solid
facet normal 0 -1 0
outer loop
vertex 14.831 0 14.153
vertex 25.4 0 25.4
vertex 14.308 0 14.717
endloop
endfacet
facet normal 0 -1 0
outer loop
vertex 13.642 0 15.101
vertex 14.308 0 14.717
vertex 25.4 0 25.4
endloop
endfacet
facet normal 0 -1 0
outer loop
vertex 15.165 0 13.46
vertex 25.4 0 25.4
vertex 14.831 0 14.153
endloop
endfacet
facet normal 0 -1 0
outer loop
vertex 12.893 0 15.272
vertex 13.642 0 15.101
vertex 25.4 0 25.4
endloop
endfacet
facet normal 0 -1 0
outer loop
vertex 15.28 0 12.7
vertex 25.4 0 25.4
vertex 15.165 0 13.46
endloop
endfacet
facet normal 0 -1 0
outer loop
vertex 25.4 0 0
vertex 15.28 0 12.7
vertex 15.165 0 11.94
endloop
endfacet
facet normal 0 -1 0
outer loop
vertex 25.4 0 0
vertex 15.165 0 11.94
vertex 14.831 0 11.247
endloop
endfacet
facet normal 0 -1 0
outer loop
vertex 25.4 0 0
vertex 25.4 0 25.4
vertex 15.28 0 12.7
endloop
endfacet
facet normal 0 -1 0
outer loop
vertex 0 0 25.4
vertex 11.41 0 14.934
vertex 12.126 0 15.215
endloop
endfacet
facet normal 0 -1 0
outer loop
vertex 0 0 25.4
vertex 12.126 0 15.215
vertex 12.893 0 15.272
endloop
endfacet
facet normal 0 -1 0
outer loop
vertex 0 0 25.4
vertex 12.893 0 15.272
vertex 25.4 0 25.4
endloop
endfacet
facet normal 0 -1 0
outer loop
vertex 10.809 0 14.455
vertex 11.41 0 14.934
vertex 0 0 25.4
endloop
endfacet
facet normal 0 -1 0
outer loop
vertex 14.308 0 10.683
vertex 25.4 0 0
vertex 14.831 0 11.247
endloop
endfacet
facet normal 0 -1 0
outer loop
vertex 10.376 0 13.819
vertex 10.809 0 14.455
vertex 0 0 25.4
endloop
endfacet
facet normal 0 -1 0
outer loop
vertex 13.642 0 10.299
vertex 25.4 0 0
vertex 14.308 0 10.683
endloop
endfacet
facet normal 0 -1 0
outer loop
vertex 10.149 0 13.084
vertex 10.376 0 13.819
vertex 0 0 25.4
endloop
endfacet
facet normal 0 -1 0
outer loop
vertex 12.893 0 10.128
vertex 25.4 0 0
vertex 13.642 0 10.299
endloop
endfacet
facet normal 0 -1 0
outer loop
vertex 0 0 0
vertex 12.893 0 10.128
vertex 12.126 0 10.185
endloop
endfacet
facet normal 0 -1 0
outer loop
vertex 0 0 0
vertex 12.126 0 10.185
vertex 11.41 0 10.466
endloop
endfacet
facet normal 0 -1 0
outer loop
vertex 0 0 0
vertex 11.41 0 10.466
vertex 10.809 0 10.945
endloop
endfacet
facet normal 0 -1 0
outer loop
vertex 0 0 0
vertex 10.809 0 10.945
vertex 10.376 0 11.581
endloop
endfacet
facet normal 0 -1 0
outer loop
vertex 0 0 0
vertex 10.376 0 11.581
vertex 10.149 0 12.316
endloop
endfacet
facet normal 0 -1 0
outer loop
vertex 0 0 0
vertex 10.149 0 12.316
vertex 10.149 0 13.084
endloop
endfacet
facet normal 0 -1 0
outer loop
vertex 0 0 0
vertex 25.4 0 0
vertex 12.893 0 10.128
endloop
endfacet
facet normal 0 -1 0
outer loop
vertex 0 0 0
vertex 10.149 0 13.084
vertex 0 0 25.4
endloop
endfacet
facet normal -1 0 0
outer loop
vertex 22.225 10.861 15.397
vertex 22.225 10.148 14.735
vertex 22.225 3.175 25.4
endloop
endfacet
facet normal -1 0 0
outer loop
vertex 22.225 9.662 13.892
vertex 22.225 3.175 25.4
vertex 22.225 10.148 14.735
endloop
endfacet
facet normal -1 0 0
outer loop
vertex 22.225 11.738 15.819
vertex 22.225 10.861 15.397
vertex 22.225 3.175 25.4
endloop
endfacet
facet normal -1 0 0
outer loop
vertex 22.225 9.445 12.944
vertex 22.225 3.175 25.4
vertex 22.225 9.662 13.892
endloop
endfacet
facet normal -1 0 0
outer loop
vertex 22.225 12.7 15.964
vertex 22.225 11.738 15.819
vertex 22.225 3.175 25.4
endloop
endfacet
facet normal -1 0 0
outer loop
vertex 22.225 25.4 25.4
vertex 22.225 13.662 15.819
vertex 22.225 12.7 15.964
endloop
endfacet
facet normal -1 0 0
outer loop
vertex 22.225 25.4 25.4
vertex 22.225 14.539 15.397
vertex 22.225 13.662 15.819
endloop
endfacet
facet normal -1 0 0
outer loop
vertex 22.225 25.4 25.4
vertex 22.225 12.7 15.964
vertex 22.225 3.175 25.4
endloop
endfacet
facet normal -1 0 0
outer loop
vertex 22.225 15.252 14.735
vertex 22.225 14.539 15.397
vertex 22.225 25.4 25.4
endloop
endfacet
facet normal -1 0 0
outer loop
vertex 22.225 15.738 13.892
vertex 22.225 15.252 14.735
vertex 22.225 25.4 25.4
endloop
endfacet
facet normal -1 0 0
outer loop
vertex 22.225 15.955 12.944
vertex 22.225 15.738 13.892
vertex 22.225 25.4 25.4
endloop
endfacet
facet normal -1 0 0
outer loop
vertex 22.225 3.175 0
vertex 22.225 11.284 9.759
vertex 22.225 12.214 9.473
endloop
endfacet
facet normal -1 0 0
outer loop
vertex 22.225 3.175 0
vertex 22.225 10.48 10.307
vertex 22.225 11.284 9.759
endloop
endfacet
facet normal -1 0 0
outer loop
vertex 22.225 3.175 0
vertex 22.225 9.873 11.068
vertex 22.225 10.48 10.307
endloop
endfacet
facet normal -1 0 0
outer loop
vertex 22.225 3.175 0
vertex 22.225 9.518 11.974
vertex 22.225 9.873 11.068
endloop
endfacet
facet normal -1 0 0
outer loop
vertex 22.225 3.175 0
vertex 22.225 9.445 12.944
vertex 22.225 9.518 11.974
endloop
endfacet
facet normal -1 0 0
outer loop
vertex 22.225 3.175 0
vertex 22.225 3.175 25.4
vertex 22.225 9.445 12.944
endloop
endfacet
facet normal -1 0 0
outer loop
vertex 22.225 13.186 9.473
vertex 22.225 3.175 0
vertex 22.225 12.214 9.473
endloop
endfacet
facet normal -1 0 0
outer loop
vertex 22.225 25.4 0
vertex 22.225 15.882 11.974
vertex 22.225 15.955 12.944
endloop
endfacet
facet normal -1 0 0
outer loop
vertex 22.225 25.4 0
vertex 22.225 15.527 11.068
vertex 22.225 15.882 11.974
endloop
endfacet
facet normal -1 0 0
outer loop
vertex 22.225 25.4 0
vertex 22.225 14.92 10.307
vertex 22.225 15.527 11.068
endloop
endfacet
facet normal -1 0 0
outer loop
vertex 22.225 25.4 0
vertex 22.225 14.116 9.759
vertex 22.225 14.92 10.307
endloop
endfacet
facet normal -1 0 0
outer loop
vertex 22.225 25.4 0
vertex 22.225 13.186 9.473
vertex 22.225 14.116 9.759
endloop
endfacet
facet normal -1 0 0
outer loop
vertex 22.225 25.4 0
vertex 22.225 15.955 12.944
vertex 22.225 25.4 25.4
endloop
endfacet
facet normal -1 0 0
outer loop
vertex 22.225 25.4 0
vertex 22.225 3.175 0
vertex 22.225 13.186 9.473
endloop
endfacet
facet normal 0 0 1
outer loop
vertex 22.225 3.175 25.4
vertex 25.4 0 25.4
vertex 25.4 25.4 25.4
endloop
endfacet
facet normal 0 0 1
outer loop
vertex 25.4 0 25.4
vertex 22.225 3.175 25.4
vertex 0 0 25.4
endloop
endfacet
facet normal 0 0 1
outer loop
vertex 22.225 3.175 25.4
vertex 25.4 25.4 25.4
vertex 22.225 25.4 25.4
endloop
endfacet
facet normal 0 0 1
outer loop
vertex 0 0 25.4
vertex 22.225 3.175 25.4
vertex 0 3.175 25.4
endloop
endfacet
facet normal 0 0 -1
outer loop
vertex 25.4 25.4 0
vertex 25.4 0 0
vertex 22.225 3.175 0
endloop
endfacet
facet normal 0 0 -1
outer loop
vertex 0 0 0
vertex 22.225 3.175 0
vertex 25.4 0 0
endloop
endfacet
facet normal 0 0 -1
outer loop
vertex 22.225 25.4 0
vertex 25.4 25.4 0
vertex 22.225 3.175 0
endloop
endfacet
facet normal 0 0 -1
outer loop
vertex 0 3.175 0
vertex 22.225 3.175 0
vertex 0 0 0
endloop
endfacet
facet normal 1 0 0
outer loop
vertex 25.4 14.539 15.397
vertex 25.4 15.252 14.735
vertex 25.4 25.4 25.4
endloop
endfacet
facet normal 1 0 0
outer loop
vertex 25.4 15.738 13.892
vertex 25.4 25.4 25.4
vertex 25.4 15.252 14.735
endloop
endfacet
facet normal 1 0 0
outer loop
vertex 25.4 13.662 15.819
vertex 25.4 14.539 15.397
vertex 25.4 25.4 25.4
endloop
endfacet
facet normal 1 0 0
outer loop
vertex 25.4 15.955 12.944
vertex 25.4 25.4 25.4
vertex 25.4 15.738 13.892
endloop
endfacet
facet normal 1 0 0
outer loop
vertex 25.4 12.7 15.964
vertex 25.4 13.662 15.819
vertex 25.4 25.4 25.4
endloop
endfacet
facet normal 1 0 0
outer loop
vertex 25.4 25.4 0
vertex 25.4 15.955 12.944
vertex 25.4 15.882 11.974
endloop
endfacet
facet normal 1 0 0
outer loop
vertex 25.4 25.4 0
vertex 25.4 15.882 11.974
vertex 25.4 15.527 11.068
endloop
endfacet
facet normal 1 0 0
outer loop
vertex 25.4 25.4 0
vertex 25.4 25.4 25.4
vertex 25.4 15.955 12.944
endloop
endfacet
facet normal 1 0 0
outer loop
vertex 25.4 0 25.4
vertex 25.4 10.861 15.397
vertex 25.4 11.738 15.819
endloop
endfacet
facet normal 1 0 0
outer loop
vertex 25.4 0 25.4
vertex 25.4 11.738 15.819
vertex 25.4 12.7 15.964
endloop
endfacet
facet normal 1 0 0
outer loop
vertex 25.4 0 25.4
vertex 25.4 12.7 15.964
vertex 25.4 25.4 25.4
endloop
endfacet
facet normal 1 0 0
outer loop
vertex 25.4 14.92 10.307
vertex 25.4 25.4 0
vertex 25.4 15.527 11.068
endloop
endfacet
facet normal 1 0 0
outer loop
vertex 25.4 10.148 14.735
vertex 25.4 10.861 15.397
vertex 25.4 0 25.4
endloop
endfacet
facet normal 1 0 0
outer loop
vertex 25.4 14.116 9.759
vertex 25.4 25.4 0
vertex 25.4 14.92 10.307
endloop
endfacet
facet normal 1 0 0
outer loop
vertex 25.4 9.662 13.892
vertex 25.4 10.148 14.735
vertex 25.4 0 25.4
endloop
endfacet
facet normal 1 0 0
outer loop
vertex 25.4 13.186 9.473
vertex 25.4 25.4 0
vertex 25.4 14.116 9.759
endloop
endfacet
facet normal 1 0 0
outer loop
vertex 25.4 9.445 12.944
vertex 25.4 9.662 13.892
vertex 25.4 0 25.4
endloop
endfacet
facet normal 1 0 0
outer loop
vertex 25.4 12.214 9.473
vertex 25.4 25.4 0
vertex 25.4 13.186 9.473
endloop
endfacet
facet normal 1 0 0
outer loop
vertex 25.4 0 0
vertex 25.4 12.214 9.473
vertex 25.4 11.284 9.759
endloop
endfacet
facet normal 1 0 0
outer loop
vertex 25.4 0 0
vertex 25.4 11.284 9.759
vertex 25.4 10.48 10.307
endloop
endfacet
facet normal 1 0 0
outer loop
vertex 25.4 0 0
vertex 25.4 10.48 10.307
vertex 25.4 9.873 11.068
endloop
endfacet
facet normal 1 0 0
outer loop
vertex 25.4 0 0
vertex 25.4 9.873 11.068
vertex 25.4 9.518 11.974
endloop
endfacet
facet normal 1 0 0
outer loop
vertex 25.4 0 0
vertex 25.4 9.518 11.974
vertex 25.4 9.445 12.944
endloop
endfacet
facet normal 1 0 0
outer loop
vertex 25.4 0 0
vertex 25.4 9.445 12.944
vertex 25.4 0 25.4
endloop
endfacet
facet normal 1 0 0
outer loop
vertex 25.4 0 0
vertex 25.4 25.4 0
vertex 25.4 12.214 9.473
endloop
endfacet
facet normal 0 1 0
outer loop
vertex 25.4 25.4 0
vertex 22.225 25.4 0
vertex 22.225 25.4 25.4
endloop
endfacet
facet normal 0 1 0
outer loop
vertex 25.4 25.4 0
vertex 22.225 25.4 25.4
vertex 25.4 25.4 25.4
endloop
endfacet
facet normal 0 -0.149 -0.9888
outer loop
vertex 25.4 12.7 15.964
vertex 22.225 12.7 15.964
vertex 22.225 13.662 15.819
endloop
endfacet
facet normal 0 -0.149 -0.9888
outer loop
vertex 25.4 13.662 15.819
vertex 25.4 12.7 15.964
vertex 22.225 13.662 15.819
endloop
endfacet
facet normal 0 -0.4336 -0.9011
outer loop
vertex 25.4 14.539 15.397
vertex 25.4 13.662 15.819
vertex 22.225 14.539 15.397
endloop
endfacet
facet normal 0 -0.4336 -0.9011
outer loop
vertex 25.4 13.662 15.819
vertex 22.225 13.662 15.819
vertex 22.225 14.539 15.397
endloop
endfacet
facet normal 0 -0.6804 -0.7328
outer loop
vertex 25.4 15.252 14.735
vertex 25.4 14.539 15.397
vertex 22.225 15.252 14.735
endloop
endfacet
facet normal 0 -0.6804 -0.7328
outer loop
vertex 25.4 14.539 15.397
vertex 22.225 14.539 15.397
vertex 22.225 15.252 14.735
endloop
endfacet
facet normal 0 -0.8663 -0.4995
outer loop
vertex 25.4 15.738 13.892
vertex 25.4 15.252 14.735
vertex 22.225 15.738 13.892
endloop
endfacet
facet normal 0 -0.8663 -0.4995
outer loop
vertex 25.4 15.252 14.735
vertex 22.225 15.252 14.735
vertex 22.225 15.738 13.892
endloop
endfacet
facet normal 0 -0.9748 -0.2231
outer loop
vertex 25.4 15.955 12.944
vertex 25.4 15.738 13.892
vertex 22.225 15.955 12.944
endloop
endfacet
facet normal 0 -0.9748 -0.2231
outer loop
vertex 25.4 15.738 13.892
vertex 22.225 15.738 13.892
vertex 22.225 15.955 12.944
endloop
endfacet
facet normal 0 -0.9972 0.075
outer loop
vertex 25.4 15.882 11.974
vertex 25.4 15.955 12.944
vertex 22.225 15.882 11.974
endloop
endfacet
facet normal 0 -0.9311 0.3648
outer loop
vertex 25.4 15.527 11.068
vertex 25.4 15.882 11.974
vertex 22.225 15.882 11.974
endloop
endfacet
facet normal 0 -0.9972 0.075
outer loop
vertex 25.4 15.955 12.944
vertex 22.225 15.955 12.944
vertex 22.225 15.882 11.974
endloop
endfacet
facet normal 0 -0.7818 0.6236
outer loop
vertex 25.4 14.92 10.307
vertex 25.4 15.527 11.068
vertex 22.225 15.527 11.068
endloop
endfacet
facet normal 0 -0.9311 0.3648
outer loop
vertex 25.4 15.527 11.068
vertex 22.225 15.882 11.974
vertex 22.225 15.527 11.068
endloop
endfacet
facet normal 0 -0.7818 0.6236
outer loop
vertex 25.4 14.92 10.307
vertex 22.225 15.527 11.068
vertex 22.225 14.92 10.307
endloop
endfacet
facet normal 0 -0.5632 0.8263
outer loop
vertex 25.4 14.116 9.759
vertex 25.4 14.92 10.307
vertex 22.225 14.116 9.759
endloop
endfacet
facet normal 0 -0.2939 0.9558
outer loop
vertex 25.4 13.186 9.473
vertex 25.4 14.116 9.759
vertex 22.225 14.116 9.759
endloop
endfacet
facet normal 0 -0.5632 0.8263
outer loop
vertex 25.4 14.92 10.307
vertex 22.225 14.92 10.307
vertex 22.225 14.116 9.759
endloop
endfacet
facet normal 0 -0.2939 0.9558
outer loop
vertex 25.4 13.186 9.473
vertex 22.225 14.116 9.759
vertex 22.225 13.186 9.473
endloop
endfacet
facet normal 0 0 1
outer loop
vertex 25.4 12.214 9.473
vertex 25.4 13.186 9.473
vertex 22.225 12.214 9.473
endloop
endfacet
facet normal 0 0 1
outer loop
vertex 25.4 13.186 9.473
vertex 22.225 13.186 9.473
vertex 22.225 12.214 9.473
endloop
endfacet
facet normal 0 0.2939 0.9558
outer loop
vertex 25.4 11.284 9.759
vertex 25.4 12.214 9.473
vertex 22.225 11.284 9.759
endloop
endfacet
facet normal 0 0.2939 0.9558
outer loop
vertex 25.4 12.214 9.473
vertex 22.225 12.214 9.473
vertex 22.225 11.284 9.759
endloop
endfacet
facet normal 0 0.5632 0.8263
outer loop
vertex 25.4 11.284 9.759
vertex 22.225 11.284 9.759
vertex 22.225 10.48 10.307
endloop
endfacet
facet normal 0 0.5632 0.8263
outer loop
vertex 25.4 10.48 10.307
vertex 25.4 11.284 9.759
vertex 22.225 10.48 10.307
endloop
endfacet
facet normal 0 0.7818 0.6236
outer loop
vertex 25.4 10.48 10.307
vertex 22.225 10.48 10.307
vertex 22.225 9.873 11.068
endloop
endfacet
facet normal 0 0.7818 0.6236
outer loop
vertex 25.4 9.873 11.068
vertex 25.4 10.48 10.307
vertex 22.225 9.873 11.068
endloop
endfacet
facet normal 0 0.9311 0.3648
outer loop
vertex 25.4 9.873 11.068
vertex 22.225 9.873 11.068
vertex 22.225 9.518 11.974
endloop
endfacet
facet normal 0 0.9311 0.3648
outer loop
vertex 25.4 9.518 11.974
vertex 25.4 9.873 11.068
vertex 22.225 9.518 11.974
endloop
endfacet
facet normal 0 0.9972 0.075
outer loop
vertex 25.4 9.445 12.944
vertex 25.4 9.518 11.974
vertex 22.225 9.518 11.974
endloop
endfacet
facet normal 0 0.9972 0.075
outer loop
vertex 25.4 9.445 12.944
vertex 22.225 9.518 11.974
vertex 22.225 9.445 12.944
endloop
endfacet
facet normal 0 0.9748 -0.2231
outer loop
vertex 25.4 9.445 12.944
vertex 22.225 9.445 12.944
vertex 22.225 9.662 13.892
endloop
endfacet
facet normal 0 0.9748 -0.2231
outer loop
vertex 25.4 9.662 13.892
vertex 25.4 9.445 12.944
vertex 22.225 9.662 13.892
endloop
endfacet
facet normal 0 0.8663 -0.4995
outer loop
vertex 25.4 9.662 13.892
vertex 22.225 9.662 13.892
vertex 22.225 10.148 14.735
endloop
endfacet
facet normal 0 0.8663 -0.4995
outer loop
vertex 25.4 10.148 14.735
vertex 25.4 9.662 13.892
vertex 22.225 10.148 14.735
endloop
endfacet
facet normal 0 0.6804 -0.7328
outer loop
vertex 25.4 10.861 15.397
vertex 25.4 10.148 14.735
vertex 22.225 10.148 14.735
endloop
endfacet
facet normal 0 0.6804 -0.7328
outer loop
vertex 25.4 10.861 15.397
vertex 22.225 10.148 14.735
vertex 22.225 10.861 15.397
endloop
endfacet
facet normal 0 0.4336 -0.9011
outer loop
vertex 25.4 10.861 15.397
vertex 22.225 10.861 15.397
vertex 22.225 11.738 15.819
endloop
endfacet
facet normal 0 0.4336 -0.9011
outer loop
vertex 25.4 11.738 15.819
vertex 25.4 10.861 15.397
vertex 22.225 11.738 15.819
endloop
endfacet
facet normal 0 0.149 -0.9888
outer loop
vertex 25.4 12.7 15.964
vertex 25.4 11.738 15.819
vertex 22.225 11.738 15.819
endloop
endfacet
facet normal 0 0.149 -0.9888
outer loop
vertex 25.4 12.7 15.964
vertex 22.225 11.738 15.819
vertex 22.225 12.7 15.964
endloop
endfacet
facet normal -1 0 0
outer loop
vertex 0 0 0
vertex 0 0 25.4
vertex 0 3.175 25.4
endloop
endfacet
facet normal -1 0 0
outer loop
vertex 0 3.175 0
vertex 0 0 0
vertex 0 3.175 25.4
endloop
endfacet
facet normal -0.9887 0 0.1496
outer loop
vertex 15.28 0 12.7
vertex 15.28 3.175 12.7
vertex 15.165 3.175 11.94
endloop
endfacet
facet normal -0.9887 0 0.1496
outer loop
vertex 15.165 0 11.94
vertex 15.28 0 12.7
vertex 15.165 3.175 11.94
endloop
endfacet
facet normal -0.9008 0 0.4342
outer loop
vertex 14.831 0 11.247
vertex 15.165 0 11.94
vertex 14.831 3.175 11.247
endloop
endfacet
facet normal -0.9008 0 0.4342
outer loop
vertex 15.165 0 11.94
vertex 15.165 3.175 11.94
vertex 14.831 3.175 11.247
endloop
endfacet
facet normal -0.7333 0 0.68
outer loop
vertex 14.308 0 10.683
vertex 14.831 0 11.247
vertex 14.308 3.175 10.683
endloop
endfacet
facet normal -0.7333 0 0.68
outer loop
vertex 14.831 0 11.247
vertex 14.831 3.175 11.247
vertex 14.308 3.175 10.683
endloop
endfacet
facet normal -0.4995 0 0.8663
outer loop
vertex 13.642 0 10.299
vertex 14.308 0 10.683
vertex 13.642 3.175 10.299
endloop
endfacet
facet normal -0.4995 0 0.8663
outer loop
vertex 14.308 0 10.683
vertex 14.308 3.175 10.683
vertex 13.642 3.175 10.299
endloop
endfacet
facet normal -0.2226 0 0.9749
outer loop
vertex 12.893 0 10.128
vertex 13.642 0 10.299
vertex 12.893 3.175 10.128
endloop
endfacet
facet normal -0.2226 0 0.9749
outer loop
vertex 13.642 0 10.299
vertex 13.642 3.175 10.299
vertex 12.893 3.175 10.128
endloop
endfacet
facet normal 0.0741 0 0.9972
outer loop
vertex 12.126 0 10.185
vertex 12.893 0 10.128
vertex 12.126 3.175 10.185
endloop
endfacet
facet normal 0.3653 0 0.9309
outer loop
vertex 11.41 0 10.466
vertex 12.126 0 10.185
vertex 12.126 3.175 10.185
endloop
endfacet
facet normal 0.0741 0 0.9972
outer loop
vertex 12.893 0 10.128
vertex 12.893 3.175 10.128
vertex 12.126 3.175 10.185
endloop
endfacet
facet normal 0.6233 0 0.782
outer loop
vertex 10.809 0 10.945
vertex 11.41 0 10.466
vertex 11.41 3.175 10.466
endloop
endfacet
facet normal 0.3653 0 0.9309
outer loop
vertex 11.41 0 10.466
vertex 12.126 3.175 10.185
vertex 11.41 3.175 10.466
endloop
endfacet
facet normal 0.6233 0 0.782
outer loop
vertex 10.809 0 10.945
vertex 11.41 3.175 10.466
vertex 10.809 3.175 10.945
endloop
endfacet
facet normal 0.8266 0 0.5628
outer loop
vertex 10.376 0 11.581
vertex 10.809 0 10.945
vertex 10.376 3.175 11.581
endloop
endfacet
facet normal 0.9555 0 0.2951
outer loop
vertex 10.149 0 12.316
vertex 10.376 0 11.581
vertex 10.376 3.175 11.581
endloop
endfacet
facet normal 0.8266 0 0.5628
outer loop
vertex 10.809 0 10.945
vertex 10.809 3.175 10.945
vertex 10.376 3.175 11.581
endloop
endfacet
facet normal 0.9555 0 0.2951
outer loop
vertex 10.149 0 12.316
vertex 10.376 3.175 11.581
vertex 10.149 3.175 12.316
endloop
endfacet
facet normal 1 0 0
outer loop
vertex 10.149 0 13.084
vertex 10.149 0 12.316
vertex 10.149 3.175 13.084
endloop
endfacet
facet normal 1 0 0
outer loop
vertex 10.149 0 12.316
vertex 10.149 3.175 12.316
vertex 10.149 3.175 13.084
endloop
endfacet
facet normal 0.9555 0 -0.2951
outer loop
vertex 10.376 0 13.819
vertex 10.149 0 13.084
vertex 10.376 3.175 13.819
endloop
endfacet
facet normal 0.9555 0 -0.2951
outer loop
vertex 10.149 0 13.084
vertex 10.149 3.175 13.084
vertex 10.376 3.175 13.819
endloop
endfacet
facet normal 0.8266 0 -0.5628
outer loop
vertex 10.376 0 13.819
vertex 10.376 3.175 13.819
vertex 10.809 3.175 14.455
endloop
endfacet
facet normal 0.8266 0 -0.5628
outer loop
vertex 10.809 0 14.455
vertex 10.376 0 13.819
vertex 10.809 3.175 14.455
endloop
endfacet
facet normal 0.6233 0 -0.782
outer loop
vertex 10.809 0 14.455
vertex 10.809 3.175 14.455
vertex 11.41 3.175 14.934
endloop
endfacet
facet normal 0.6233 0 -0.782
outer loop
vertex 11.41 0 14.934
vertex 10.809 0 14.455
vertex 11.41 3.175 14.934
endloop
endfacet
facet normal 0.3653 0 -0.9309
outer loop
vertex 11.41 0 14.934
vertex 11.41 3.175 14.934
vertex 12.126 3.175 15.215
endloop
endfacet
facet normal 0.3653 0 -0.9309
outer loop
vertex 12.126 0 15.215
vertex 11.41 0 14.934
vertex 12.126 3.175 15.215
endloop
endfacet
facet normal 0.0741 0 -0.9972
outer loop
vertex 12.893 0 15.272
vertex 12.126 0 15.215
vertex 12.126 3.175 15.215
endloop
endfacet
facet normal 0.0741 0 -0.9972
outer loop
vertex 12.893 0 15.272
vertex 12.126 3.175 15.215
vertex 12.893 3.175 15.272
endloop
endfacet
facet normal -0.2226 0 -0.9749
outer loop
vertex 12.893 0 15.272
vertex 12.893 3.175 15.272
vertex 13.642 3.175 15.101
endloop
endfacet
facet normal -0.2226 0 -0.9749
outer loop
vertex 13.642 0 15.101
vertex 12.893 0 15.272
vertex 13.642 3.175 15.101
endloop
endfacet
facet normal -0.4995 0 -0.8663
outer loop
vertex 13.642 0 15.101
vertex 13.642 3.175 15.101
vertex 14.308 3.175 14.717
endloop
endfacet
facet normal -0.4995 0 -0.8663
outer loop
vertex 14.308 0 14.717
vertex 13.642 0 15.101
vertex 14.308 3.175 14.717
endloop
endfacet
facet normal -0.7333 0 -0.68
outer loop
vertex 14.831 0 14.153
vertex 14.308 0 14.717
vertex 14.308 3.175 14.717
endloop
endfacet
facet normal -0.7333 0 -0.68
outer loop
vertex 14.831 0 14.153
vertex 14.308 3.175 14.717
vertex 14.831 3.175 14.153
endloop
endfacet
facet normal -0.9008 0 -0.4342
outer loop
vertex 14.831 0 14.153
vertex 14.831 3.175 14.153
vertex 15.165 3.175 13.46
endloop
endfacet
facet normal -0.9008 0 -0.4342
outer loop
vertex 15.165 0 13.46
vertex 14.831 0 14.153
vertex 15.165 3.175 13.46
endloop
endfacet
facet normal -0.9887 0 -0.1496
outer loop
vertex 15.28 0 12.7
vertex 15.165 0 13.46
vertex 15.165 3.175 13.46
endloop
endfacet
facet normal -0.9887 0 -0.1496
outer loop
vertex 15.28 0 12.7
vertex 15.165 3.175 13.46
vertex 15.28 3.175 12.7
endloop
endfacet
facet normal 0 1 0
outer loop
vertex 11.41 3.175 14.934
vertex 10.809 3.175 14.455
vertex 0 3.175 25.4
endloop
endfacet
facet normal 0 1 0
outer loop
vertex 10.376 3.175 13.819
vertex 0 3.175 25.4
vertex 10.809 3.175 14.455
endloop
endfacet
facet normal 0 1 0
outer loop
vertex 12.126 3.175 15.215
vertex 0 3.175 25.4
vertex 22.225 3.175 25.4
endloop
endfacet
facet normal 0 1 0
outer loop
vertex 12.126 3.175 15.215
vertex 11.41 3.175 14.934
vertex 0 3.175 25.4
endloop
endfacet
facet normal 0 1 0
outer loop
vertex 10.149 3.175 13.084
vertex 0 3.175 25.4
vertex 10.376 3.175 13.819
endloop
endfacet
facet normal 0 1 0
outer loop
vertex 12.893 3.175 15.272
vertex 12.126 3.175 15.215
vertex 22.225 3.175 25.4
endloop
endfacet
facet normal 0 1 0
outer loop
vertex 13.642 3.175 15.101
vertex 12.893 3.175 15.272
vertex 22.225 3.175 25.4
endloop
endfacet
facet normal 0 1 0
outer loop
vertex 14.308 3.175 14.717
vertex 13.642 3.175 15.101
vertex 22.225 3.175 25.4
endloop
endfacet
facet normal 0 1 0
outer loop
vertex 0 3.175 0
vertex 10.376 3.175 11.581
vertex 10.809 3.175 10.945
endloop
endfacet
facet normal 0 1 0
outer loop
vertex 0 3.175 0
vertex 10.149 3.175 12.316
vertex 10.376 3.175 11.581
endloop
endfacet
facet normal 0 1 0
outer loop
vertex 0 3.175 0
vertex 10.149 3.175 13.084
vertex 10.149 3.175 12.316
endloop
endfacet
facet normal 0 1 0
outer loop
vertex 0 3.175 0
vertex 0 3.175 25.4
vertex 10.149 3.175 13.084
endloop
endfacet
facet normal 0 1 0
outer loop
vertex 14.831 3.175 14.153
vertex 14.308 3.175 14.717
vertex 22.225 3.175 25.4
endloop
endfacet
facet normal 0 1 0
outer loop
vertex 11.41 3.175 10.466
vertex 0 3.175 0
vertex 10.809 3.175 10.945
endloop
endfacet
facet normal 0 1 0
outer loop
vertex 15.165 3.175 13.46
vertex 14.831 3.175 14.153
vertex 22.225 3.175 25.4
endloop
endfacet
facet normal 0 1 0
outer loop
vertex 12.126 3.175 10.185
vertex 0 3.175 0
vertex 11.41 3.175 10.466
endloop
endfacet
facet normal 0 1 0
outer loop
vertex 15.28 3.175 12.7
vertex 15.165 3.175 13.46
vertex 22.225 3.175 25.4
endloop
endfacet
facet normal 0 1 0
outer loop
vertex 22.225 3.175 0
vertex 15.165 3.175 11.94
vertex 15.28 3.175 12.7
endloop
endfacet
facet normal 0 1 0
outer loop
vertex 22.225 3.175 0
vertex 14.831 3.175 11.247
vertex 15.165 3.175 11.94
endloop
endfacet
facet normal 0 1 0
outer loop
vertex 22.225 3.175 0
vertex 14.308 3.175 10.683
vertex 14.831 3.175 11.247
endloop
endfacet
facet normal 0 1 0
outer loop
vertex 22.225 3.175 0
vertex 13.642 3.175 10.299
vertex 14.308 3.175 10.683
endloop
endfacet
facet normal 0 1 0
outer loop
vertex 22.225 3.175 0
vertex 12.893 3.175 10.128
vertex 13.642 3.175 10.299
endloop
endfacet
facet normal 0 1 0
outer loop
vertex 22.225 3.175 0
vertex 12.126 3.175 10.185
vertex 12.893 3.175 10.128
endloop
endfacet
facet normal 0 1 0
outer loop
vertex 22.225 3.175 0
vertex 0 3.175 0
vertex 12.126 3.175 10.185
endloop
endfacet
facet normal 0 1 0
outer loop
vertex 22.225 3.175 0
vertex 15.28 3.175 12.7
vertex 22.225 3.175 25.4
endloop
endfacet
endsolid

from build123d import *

# Parameters (mm, degrees)
BOSS_EXTRUDE1_DEPTH              = 25.4
F_13_64_0_20313_DIAMETER_HOLE1_D = 5.159375
F_0_257_DIAMETER_HOLE1_D         = 6.5278


with BuildPart() as part:
    # Sketch1 → Boss-Extrude1 (new body)
    with BuildSketch(Plane.XY):
        Polygon((0, 3.175), (22.225, 3.175), (22.225, 25.4), (25.4, 25.4), (25.4, 0), (0, 0), align=None)
    extrude(amount=BOSS_EXTRUDE1_DEPTH)

    # 13/64 (0.20313) Diameter Hole1 (through all)
    with Locations(Plane(origin=(0, 0, 0), x_dir=(-1, 0, 0), z_dir=(0, -1, 0))):
        with Locations((-12.7, -12.7)):
            Hole(F_13_64_0_20313_DIAMETER_HOLE1_D / 2)

    # F (0.257) Diameter Hole1 (through all)
    with Locations(Plane(origin=(25.4, 0, 0), x_dir=(0, 0, -1), z_dir=(1, 0, 0))):
        with Locations((-12.7, 12.7)):
            Hole(F_0_257_DIAMETER_HOLE1_D / 2)


solid = part.part
